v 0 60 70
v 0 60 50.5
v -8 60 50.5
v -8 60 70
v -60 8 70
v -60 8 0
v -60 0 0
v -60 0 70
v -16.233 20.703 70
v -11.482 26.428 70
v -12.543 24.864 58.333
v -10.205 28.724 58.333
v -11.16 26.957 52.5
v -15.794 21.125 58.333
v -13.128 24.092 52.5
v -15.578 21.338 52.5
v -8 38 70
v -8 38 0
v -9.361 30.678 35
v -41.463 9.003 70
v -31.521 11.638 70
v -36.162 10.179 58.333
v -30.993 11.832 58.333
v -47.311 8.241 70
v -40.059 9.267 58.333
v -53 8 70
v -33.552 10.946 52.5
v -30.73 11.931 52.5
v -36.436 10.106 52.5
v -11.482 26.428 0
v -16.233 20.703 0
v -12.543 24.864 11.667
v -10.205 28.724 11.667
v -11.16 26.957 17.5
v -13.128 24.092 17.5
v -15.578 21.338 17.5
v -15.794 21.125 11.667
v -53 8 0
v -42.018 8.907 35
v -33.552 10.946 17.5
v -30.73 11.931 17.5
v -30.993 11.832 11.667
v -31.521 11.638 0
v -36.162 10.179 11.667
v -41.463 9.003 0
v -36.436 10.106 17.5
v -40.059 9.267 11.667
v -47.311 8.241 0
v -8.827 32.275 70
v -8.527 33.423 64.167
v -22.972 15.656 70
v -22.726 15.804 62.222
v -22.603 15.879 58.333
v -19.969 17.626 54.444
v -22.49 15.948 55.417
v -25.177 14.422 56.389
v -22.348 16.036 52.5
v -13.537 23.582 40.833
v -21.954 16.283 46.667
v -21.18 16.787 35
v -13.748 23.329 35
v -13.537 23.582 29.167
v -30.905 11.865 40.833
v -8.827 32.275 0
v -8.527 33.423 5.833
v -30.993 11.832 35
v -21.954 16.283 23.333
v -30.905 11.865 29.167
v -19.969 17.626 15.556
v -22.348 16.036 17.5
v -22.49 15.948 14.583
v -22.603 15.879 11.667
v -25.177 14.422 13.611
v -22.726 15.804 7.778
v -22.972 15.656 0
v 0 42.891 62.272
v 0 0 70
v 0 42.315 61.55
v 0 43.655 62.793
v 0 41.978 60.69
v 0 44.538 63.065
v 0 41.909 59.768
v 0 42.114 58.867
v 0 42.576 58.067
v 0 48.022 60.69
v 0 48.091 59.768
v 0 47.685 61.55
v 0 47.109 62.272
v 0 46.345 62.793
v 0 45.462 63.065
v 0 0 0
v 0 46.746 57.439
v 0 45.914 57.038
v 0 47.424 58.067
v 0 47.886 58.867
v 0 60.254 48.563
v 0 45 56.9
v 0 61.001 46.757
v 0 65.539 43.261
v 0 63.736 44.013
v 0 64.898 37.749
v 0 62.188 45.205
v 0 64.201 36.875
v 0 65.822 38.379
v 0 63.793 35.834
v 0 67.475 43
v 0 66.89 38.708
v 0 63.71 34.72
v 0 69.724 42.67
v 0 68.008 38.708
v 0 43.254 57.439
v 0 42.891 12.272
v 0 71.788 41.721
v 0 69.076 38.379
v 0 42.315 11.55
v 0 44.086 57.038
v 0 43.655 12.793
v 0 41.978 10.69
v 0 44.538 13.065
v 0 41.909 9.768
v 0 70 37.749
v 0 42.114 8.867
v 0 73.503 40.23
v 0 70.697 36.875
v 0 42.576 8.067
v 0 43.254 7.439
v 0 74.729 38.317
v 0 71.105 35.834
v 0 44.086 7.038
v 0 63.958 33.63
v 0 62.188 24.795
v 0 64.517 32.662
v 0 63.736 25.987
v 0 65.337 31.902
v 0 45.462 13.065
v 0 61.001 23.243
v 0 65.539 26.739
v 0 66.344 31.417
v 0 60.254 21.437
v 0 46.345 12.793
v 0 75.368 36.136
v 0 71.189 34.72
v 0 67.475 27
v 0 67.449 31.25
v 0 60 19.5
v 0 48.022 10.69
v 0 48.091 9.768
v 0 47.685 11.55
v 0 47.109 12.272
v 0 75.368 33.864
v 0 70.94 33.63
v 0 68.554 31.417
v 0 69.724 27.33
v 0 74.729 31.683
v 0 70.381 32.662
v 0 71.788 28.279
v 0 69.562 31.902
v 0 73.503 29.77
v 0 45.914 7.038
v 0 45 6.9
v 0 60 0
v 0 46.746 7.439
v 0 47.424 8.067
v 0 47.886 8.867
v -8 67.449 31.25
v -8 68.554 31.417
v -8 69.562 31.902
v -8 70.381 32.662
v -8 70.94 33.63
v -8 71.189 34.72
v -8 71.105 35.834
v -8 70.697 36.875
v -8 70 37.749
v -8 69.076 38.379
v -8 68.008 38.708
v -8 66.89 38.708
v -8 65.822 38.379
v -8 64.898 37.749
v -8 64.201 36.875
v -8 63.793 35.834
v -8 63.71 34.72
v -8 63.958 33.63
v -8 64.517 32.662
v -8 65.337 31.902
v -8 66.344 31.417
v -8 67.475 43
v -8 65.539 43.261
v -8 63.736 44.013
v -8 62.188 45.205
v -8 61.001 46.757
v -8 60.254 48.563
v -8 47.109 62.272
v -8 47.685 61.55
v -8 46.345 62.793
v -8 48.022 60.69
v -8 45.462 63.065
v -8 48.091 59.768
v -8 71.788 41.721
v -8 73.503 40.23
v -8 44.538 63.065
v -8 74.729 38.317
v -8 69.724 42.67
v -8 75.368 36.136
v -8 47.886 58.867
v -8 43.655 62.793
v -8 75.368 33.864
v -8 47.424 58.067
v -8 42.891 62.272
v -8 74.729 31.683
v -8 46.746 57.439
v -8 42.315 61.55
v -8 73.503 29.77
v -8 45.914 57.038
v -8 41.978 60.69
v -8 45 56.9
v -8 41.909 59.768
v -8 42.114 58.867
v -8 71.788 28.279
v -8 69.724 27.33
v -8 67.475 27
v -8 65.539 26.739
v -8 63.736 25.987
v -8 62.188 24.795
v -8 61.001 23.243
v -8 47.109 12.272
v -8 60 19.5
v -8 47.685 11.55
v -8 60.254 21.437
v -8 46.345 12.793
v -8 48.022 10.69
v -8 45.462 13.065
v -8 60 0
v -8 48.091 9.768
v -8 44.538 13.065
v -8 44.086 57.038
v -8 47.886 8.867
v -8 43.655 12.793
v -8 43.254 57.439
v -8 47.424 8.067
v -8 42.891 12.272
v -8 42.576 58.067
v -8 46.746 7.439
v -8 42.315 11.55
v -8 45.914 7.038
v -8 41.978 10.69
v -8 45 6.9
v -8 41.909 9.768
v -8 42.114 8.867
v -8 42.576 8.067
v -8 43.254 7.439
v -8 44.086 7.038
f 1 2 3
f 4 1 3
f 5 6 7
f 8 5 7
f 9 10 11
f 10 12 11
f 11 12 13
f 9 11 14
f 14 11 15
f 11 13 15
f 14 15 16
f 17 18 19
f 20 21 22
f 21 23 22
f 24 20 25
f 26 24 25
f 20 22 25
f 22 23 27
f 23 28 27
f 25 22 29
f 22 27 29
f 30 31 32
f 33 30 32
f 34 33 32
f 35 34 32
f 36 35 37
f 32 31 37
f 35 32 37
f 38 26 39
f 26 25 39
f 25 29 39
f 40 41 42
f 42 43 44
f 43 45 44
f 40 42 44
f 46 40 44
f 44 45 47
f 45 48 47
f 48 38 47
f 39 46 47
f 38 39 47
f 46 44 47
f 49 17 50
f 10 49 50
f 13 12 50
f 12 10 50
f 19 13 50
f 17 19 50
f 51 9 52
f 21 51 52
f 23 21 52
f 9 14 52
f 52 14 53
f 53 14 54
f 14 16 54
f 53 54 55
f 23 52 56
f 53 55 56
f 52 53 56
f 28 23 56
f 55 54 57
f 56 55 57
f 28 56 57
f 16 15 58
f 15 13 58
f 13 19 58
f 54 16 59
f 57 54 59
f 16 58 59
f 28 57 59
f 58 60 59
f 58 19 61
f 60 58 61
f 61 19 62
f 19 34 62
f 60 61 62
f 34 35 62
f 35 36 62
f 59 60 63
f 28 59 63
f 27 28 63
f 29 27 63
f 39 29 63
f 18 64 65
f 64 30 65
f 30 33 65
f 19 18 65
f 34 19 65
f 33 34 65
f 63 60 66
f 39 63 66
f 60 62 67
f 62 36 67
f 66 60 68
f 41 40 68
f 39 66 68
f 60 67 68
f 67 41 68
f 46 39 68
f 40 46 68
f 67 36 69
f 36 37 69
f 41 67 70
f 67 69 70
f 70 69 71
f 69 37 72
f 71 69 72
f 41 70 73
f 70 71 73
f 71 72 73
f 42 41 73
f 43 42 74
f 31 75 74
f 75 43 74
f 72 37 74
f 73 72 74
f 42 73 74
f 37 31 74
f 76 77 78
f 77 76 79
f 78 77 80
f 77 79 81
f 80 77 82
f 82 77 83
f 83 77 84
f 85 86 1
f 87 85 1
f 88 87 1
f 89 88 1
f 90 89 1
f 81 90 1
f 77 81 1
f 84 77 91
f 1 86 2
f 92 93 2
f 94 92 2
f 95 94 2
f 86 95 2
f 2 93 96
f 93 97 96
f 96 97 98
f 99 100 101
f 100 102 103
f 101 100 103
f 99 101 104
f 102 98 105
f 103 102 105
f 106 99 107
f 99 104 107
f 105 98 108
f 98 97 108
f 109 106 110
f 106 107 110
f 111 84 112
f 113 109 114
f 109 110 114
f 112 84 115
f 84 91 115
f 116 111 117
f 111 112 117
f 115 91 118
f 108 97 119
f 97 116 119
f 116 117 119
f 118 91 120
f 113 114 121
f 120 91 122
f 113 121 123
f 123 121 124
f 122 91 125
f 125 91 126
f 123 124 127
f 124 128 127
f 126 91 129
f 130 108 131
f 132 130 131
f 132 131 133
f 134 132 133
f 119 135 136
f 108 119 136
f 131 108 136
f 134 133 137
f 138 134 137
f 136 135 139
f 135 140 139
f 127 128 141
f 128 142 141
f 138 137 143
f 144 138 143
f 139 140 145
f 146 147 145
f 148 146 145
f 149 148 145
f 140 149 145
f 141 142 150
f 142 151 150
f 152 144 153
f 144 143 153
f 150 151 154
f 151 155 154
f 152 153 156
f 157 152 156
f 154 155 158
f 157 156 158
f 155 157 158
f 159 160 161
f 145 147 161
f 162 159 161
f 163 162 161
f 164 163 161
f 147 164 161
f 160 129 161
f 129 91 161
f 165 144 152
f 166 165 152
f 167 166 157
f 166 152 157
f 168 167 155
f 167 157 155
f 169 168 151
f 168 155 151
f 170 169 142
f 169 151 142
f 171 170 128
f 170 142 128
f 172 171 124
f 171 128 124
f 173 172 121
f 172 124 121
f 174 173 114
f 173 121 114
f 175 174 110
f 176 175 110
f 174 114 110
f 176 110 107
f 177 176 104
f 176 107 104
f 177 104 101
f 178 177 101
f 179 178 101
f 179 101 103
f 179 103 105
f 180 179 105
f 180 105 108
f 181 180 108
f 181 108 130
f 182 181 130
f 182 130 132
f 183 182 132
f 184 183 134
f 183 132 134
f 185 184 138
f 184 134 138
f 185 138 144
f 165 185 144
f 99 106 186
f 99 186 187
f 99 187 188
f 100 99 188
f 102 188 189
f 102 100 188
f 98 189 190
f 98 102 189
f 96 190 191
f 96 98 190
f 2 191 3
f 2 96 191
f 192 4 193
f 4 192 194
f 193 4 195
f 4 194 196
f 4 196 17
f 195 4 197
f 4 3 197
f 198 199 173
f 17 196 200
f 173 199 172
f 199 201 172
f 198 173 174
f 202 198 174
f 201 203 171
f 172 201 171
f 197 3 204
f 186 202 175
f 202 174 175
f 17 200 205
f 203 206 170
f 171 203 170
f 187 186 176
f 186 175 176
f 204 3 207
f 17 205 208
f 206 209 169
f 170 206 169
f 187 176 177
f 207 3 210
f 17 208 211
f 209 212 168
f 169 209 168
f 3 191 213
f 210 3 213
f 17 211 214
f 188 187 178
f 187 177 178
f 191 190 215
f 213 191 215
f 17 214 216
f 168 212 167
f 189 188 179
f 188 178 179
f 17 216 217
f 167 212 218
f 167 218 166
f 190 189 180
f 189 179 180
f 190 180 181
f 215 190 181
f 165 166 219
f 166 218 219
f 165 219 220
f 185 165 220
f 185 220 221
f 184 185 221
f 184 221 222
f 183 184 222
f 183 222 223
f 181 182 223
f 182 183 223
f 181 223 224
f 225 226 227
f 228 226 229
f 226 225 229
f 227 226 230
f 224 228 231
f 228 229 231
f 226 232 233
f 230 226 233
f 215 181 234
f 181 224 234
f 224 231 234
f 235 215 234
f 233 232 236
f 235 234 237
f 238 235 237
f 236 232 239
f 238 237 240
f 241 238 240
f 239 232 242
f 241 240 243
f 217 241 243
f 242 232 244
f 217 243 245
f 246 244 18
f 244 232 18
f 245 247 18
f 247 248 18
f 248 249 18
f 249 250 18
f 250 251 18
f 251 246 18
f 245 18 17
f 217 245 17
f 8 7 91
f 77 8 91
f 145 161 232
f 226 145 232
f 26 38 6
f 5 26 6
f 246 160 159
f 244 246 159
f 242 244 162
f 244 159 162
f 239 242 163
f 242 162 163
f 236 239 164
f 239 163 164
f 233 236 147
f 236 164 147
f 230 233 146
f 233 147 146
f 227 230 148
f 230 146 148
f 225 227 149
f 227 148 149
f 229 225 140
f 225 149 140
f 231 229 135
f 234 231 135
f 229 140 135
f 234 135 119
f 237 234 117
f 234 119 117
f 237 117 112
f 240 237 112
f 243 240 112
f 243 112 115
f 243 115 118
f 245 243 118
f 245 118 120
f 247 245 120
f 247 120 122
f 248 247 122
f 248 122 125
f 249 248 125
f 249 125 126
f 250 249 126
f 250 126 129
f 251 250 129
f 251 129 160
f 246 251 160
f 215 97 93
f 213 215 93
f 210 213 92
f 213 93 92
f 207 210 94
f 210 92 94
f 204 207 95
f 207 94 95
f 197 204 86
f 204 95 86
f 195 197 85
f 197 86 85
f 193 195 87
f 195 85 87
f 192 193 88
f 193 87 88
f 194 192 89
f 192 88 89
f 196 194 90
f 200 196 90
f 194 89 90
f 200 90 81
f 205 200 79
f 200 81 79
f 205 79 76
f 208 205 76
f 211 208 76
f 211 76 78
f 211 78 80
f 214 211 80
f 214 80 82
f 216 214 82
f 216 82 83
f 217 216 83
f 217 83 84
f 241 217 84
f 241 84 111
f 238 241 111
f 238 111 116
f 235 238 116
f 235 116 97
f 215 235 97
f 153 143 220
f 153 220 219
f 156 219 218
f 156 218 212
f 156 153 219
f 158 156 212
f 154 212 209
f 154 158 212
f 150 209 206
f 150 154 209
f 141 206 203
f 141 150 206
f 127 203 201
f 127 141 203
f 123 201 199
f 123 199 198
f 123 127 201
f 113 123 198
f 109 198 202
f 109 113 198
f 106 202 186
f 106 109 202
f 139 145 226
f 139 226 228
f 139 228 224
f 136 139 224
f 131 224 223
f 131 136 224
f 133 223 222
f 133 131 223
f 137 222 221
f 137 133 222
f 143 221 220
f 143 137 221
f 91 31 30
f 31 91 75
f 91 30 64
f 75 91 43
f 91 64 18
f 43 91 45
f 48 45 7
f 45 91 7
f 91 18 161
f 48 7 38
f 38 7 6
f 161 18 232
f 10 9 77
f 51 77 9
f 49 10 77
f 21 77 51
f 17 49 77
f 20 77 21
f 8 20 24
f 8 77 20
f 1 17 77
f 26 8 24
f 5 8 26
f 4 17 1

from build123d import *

# Parameters (mm, degrees)
RESSALTO_EXTRUS_O1_DEPTH = 70
CORTE_EXTRUS_O1_REACH    = 112
ESBO_O2_R                = 3.1
FILETE1_SIZE             = 30
FILETE1_SIZE_2           = 45
ESBO_O3_R                = 3.75
RESSALTO_EXTRUS_O2_DEPTH = 8


with BuildPart() as part:
    # Esboço1 → Ressalto-extrusão1 (new body)
    with BuildSketch(Plane.XY):
        Polygon((0, 0), (0, 60), (-8, 60), (-8, 8), (-60, 8), (-60, 0), align=None)
    extrude(amount=RESSALTO_EXTRUS_O1_DEPTH)

    # Esboço2 → Corte-extrusão1 (cut, up to next)
    with BuildSketch(Plane(origin=(0, 0, 0), x_dir=(0, 0, -1), z_dir=(1, 0, 0)), mode=Mode.PRIVATE) as corte_extrus_o1_sk1:
        with Locations((-60, 45)):
            Circle(ESBO_O2_R)
    corte_extrus_o1_tool1 = extrude(corte_extrus_o1_sk1.sketch, amount=-CORTE_EXTRUS_O1_REACH, mode=Mode.PRIVATE) & part.part
    # Esboço2 → Corte-extrusão1 (cut, up to next)
    with BuildSketch(Plane(origin=(0, 0, 0), x_dir=(0, 0, -1), z_dir=(1, 0, 0)), mode=Mode.PRIVATE) as corte_extrus_o1_sk2:
        with Locations((-10, 45)):
            Circle(ESBO_O2_R)
    corte_extrus_o1_tool2 = extrude(corte_extrus_o1_sk2.sketch, amount=-CORTE_EXTRUS_O1_REACH, mode=Mode.PRIVATE) & part.part
    add(corte_extrus_o1_tool1.solids().sort_by_distance((0, 45, 60))[0], mode=Mode.SUBTRACT)
    add(corte_extrus_o1_tool2.solids().sort_by_distance((0, 45, 10))[0], mode=Mode.SUBTRACT)

    # Filete1
    # an asymmetric fillet: 45, 30 mm, written as the material it adds along each edge
    with BuildSketch(Plane(origin=(-8, 8, 0), x_dir=(0, 1, 0), z_dir=(0, 0, 1))) as filete1_piece_1:
        with BuildLine():
            Bezier((FILETE1_SIZE, 0), (0, 0), (0, FILETE1_SIZE_2), weights=[1, 0.707106781, 1])
            Line((0, FILETE1_SIZE_2), (0, 0))
            Line((0, 0), (FILETE1_SIZE, 0))
        make_face()
    extrude(amount=70)

    # Esboço3 → Ressalto-extrusão2 (add)
    with BuildSketch(Plane(origin=(0, 0, 0), x_dir=(0, 0, -1), z_dir=(1, 0, 0))):
        with BuildLine():
            Line((-50.499916272, 60), (-19.500083728, 60))
            ThreePointArc((-19.500083728, 60), (-24.794661769, 62.187990647), (-27.000043214, 67.475348435))
            ThreePointArc((-27.000043214, 67.475348435), (-35, 75.449053432), (-42.999956786, 67.475348435))
            ThreePointArc((-42.999956786, 67.475348435), (-45.205338231, 62.187990647), (-50.499916272, 60))
        make_face()
        with Locations((-35, 67.449053432)):
            Circle(ESBO_O3_R, mode=Mode.SUBTRACT)
    extrude(amount=-RESSALTO_EXTRUS_O2_DEPTH)


solid = part.part
